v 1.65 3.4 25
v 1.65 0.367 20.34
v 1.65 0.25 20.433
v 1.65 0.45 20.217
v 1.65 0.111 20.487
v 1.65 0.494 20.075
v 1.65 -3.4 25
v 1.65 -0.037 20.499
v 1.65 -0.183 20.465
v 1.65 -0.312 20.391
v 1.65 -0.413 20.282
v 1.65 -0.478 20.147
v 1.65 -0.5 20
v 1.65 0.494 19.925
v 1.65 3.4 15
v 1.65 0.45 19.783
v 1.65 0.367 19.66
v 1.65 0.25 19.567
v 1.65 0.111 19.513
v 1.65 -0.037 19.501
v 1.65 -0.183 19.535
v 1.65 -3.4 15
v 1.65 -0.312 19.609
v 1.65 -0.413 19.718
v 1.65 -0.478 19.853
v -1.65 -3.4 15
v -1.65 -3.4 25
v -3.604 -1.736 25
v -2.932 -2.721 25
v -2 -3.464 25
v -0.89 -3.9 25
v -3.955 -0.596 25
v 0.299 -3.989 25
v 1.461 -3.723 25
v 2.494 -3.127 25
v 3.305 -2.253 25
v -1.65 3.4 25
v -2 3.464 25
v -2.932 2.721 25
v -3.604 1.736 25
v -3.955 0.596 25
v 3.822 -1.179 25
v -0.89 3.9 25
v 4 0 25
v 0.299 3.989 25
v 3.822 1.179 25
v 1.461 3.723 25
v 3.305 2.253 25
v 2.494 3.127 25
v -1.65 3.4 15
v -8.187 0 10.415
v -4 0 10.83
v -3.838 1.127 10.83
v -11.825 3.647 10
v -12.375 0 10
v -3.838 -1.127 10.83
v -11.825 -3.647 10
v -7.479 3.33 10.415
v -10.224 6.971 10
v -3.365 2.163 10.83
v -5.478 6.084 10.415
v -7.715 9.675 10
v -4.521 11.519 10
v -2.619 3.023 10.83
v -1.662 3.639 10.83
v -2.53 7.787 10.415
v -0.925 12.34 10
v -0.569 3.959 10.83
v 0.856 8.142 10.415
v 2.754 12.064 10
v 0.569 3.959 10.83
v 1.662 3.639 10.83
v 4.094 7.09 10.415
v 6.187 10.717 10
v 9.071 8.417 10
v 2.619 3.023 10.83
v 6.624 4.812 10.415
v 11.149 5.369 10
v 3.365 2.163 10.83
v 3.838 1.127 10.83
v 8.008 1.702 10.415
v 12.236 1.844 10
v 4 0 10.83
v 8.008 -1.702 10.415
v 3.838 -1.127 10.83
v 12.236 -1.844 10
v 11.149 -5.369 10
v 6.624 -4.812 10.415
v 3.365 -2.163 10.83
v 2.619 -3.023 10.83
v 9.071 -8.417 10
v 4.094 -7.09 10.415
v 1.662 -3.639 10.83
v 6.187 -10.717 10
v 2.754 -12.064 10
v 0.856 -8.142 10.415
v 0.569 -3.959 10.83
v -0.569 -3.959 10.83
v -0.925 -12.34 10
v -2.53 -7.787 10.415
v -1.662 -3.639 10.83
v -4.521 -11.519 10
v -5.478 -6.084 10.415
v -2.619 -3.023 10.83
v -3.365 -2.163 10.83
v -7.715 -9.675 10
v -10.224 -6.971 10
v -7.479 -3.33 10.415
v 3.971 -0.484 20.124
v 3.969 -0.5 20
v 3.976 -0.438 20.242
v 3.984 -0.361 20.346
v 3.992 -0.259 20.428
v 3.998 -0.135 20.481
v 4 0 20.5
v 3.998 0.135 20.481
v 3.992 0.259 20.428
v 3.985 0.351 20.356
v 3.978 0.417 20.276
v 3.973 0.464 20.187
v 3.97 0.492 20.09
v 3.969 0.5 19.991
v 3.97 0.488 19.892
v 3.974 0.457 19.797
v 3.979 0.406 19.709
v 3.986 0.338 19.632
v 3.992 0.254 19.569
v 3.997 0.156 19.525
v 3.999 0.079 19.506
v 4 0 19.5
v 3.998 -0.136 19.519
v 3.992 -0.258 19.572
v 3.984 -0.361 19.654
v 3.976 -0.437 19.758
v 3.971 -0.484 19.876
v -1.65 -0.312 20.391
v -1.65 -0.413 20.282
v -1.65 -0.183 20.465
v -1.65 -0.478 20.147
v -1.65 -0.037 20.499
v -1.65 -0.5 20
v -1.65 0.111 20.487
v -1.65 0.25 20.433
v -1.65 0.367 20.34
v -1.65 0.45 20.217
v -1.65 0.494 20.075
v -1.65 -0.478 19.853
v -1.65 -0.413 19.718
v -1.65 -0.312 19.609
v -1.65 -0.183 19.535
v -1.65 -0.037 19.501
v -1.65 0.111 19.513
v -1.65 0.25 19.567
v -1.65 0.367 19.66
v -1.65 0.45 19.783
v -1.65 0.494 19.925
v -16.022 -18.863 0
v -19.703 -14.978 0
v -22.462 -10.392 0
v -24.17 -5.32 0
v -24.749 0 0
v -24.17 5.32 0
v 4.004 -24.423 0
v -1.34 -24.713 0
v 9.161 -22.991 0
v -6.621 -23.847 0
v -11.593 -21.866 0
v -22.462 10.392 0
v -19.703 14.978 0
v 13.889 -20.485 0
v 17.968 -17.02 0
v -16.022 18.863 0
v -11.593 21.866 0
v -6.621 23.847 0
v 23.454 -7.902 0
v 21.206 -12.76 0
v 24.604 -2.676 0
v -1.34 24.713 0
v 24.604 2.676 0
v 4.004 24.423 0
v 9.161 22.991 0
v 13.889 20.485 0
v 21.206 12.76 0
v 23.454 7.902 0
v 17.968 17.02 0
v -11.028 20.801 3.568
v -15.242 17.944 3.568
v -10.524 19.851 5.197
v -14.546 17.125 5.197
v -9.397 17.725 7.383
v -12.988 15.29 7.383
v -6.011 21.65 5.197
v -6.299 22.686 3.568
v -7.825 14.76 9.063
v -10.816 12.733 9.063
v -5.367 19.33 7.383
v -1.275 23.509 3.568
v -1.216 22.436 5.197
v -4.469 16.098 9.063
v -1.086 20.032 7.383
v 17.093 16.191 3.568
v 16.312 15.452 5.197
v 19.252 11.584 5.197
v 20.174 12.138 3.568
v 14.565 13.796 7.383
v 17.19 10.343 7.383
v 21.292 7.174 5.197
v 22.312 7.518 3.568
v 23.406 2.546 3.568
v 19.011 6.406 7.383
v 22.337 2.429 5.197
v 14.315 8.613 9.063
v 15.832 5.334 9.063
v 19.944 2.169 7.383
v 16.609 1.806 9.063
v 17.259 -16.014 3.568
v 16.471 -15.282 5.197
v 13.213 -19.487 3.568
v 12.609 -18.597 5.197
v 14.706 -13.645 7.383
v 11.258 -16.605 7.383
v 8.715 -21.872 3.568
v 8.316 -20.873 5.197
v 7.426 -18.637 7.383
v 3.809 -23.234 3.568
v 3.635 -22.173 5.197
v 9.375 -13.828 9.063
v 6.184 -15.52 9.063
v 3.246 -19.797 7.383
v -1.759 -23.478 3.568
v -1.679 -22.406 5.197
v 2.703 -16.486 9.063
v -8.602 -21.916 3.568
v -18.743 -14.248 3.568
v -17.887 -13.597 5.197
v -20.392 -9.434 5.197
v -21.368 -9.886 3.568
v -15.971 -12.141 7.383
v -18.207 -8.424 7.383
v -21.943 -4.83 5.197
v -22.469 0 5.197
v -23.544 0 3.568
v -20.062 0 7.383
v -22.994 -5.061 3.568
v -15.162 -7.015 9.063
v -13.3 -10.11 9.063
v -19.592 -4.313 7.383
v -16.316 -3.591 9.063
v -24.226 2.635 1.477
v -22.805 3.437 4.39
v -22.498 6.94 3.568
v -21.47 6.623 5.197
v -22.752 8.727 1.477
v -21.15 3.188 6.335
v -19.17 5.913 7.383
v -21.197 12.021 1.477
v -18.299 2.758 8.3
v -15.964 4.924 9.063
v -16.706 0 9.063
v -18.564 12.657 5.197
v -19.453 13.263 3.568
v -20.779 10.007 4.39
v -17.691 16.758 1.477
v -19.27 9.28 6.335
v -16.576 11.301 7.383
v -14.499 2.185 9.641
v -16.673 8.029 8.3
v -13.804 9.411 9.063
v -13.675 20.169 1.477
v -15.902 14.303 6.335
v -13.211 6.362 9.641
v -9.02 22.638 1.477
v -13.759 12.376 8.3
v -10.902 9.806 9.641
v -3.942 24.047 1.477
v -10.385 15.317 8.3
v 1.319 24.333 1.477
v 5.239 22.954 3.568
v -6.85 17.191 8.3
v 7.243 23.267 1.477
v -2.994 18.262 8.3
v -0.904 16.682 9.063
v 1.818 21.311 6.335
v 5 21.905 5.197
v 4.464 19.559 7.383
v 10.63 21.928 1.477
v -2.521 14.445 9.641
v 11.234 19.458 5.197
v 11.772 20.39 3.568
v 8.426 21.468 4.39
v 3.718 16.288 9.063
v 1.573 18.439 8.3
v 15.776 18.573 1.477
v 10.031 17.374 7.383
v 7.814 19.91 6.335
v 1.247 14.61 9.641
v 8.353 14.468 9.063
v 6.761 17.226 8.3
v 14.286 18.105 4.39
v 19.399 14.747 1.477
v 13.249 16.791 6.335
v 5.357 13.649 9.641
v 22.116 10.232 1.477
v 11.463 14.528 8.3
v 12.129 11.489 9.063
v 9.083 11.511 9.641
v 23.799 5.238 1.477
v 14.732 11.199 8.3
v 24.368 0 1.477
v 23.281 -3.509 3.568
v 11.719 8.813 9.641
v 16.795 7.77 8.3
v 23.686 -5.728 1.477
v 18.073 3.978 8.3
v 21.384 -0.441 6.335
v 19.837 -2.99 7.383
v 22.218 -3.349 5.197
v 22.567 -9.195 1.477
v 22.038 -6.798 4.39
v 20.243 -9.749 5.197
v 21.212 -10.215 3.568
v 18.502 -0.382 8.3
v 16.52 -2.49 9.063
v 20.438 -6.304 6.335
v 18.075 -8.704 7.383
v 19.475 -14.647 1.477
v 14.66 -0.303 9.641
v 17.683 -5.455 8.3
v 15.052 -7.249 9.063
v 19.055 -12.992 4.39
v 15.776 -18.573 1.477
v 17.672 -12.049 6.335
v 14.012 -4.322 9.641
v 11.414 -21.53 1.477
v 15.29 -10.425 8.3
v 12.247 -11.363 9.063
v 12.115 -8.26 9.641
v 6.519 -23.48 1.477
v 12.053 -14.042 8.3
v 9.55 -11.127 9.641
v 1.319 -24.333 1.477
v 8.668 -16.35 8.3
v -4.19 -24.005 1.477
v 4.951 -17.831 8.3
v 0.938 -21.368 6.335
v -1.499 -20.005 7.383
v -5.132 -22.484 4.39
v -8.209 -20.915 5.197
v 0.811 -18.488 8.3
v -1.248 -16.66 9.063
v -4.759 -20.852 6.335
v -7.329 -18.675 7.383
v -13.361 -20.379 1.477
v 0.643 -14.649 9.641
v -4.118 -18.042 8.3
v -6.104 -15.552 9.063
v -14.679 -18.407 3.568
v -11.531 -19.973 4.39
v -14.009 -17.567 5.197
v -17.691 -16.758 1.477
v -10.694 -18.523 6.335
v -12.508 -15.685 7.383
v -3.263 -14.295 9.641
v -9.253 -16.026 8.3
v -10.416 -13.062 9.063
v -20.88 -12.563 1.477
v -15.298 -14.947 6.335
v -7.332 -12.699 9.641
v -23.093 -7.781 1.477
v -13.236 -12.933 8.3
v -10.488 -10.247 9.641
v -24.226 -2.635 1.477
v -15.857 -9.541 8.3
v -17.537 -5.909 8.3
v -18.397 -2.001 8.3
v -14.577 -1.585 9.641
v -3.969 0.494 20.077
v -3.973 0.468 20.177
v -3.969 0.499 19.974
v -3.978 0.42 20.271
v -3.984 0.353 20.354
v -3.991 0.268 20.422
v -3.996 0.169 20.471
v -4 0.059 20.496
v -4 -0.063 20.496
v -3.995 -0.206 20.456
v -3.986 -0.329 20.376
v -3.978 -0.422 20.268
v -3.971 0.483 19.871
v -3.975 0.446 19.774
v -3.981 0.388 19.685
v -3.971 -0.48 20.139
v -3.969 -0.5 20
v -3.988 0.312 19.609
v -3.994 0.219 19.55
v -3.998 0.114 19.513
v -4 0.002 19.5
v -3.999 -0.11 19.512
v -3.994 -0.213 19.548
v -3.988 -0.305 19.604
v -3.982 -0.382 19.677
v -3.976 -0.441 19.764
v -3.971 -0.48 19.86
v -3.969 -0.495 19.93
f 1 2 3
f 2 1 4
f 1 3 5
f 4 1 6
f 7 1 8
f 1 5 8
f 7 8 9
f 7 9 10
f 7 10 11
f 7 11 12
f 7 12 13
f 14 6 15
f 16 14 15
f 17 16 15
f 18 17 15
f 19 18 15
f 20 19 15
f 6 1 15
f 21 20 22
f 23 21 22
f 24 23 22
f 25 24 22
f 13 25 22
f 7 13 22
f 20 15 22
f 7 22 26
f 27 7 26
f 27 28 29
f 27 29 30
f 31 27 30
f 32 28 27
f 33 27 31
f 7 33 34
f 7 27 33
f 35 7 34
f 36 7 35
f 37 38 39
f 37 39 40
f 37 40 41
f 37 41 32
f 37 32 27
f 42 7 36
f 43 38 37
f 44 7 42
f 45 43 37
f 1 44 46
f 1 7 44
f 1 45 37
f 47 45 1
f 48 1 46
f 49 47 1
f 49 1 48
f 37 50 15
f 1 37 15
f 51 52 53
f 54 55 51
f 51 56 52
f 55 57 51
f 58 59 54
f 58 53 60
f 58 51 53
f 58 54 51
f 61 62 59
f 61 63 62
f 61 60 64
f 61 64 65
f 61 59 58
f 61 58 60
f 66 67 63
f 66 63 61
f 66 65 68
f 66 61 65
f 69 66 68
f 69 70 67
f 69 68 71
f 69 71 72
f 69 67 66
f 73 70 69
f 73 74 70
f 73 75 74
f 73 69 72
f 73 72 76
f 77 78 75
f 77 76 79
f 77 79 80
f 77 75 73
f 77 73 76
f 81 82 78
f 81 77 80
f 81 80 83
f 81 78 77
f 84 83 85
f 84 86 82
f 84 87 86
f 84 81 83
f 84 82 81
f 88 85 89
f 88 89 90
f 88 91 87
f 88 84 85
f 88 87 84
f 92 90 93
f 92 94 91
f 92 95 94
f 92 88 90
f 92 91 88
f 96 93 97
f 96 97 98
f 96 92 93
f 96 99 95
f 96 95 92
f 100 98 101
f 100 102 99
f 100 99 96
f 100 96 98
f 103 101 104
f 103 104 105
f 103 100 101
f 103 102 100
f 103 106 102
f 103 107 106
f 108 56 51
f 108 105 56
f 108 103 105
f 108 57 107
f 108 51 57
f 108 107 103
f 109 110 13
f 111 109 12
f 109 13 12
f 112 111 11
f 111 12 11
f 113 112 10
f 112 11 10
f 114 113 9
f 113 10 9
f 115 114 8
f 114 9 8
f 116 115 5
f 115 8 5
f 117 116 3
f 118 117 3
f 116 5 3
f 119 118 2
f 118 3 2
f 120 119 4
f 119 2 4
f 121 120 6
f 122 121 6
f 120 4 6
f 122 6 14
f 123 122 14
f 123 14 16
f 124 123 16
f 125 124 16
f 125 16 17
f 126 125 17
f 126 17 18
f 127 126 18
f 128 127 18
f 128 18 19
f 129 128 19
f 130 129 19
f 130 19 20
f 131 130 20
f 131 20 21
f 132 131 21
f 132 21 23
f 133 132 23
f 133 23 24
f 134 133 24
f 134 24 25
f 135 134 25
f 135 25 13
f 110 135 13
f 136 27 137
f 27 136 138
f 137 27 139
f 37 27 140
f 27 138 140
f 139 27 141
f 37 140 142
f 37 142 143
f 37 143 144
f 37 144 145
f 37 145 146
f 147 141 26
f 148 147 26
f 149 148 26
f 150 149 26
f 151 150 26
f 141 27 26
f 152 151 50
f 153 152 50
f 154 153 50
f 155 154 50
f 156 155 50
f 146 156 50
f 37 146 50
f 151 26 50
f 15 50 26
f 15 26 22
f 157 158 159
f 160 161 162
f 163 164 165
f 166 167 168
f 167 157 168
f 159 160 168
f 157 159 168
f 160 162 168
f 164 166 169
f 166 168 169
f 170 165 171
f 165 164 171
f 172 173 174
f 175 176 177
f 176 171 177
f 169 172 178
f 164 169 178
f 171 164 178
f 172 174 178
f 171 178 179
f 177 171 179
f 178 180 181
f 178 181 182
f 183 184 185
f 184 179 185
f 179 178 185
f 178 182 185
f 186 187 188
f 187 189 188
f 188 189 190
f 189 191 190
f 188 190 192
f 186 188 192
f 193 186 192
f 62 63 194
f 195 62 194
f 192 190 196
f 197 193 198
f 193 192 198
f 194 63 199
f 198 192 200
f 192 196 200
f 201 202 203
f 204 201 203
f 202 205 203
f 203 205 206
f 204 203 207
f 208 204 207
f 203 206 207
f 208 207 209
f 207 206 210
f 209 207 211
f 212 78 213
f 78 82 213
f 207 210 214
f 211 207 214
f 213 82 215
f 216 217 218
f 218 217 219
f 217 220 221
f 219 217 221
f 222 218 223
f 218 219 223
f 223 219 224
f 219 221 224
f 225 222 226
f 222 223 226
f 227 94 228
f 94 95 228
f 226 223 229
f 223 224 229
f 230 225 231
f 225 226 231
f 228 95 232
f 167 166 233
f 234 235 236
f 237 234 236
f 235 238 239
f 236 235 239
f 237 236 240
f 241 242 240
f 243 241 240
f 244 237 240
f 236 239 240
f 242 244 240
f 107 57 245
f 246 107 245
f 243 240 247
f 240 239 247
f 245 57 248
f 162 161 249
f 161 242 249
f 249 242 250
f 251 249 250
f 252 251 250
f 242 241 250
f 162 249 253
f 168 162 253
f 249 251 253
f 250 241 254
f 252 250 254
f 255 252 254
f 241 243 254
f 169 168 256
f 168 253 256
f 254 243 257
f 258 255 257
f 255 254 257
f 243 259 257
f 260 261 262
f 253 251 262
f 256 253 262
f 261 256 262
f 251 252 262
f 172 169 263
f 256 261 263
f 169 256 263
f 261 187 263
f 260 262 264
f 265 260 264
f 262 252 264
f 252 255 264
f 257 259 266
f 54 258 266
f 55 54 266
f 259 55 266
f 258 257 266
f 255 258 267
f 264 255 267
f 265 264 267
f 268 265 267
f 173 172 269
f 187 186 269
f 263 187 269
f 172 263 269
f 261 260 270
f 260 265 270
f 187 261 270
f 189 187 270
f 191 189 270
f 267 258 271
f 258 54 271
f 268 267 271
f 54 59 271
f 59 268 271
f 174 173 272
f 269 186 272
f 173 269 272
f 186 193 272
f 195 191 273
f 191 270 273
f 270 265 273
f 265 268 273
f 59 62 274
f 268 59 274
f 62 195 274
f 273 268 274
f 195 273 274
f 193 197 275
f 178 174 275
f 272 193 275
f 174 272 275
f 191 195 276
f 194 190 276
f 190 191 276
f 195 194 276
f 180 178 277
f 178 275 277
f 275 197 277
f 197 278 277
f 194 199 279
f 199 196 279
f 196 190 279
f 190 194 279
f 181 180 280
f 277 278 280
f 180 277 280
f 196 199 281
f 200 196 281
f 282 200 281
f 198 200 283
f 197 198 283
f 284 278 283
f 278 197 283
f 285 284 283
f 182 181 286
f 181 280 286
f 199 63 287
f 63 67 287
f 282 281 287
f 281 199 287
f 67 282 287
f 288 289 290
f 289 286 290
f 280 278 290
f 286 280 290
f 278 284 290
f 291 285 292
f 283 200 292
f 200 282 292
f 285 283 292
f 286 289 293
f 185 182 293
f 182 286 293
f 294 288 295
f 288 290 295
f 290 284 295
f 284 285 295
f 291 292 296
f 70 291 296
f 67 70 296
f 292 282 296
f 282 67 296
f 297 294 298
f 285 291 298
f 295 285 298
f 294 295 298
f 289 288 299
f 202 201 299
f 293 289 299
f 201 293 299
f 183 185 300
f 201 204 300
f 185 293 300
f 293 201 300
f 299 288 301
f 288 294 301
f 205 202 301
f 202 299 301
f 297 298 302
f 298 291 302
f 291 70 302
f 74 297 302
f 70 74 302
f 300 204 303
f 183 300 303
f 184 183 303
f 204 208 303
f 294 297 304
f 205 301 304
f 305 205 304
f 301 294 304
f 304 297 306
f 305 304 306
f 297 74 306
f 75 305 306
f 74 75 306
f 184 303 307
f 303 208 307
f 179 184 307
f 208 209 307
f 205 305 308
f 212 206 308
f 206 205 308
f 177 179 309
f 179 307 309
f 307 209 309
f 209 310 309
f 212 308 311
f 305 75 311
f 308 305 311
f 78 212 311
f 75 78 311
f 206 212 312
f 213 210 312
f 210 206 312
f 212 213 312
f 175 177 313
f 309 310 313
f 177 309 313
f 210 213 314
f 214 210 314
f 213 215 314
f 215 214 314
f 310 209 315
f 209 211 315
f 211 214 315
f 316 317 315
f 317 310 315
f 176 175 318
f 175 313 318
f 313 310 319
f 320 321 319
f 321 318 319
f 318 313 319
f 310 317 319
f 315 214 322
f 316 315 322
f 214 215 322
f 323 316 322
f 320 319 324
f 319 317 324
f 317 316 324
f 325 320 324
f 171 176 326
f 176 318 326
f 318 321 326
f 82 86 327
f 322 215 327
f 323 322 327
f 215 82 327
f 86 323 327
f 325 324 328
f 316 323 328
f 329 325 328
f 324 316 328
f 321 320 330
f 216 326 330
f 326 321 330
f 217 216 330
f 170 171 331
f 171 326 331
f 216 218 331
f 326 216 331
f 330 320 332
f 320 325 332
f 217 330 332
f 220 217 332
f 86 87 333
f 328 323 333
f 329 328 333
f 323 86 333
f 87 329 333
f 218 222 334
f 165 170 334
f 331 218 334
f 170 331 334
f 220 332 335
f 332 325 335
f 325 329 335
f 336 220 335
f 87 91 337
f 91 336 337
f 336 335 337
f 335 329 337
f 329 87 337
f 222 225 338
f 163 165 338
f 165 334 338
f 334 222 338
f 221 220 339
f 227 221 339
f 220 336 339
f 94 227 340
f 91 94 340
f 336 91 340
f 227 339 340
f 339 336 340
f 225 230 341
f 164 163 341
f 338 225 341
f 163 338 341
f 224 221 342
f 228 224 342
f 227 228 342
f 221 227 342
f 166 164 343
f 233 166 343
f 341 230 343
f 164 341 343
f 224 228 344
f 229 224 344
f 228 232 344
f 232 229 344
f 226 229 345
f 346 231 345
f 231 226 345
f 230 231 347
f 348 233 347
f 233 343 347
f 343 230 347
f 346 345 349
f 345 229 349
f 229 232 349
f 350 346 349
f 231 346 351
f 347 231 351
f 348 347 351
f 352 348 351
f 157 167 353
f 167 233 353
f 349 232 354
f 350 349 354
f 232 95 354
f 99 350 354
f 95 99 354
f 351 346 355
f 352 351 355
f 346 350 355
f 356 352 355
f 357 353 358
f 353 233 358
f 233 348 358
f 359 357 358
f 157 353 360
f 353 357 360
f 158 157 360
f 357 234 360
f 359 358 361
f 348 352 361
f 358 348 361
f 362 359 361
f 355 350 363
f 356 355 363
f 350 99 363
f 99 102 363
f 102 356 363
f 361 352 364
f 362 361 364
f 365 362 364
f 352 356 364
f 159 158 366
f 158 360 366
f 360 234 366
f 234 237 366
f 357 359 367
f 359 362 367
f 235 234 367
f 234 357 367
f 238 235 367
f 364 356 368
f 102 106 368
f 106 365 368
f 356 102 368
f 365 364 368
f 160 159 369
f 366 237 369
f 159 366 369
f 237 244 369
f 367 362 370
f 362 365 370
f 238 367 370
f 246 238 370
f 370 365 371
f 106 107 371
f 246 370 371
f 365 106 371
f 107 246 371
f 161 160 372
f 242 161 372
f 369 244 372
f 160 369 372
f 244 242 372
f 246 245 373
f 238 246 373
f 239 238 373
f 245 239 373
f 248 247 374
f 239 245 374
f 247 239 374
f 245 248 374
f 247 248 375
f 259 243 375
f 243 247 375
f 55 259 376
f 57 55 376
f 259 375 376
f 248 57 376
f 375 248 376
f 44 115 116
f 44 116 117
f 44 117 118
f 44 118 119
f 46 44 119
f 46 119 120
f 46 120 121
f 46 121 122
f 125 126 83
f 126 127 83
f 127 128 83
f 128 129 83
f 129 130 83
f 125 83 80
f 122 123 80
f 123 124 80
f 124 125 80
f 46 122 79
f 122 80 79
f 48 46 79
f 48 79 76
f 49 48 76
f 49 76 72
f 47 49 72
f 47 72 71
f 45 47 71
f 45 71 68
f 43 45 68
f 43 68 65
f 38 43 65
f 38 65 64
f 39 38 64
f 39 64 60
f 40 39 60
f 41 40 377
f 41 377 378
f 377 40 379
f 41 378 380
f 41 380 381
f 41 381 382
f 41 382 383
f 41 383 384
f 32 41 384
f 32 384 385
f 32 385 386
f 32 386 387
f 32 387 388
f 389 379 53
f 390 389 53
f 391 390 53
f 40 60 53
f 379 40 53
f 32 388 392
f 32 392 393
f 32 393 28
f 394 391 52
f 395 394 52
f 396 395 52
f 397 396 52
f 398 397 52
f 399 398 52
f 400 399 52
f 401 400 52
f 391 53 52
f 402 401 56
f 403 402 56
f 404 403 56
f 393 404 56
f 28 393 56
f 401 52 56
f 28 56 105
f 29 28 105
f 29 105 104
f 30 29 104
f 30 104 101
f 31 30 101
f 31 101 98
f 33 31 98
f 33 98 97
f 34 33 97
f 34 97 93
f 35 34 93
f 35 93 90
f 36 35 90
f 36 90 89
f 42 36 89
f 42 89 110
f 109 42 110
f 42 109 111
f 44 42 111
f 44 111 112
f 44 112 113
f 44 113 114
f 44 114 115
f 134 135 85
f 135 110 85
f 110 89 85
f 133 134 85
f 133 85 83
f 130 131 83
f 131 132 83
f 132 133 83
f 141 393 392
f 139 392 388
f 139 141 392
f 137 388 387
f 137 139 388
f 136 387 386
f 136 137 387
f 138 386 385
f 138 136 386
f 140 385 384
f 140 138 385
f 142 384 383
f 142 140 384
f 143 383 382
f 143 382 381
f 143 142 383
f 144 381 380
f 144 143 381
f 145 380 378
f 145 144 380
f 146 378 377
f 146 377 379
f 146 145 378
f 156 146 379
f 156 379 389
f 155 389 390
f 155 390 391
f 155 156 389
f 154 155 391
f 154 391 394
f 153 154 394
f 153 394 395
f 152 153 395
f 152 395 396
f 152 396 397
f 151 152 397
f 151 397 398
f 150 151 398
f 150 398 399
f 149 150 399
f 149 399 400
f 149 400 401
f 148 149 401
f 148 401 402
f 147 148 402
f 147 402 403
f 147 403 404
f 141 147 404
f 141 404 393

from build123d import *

# Parameters (mm, degrees)
F0_R          = 4
F1_DEPTH      = 25
F0_W          = 3.3
F0_H          = 3.4
F4_DEPTH      = 15
F5_R          = 0.5
F6_DEPTH      = 26.4001190755
F6_DEPTH_BACK = 25


with BuildPart() as f1:
    # F0 (on Top) → F1 (new body)
    with BuildSketch(Plane.XY):
        Circle(F0_R)
        Polygon((-1.65, 3.4), (1.65, 3.4), (1.65, 0), (1.65, -3.4), (-1.65, -3.4), (-1.65, 0), align=None, mode=Mode.SUBTRACT)
    extrude(amount=F1_DEPTH)

    # F2 (on Front) → F3 (revolve)
    with BuildSketch(Plane.XZ):
        with BuildLine():
            Line((-24.7491189755, 0), (0, 0))
            Line((0, 0), (0, 10))
            Line((0, 10), (0, 11.2270785248))
            Line((0, 11.2270785248), (-12.3745594877, 10))
            add(Edge.make_bspline(
                [(-24.7491189755, 0), (-24.5552147878, 0.7300171854), (-23.7249598085, 5.3215287656), (-17.9770797483, 9.444446301), (-12.3745594877, 10)],
                knots=[0, 0, 0, 0, 0.3719475725, 1, 1, 1, 1], degree=3))
        make_face()
    revolve(axis=Axis((0, 0, 0), (0, 0, -1)))

    # F0 (on Top) → F4 (join)
    with BuildSketch(Plane.XY):
        with Locations((0, 1.7)):
            Rectangle(F0_W, F0_H)
        with Locations((0, -1.7)):
            Rectangle(F0_W, F0_H)
    extrude(amount=F4_DEPTH)

    # F5 (on face) → F6 (cut, two sides)
    with BuildSketch(Plane(origin=(1.65, 0, 0), x_dir=(0, -1, 0), z_dir=(-1, 0, 0))) as f6_sk:
        with Locations((0, 20)):
            Circle(F5_R)
    extrude(amount=F6_DEPTH, mode=Mode.SUBTRACT)
    extrude(f6_sk.sketch, amount=-F6_DEPTH_BACK, mode=Mode.SUBTRACT)


solid = f1.part
